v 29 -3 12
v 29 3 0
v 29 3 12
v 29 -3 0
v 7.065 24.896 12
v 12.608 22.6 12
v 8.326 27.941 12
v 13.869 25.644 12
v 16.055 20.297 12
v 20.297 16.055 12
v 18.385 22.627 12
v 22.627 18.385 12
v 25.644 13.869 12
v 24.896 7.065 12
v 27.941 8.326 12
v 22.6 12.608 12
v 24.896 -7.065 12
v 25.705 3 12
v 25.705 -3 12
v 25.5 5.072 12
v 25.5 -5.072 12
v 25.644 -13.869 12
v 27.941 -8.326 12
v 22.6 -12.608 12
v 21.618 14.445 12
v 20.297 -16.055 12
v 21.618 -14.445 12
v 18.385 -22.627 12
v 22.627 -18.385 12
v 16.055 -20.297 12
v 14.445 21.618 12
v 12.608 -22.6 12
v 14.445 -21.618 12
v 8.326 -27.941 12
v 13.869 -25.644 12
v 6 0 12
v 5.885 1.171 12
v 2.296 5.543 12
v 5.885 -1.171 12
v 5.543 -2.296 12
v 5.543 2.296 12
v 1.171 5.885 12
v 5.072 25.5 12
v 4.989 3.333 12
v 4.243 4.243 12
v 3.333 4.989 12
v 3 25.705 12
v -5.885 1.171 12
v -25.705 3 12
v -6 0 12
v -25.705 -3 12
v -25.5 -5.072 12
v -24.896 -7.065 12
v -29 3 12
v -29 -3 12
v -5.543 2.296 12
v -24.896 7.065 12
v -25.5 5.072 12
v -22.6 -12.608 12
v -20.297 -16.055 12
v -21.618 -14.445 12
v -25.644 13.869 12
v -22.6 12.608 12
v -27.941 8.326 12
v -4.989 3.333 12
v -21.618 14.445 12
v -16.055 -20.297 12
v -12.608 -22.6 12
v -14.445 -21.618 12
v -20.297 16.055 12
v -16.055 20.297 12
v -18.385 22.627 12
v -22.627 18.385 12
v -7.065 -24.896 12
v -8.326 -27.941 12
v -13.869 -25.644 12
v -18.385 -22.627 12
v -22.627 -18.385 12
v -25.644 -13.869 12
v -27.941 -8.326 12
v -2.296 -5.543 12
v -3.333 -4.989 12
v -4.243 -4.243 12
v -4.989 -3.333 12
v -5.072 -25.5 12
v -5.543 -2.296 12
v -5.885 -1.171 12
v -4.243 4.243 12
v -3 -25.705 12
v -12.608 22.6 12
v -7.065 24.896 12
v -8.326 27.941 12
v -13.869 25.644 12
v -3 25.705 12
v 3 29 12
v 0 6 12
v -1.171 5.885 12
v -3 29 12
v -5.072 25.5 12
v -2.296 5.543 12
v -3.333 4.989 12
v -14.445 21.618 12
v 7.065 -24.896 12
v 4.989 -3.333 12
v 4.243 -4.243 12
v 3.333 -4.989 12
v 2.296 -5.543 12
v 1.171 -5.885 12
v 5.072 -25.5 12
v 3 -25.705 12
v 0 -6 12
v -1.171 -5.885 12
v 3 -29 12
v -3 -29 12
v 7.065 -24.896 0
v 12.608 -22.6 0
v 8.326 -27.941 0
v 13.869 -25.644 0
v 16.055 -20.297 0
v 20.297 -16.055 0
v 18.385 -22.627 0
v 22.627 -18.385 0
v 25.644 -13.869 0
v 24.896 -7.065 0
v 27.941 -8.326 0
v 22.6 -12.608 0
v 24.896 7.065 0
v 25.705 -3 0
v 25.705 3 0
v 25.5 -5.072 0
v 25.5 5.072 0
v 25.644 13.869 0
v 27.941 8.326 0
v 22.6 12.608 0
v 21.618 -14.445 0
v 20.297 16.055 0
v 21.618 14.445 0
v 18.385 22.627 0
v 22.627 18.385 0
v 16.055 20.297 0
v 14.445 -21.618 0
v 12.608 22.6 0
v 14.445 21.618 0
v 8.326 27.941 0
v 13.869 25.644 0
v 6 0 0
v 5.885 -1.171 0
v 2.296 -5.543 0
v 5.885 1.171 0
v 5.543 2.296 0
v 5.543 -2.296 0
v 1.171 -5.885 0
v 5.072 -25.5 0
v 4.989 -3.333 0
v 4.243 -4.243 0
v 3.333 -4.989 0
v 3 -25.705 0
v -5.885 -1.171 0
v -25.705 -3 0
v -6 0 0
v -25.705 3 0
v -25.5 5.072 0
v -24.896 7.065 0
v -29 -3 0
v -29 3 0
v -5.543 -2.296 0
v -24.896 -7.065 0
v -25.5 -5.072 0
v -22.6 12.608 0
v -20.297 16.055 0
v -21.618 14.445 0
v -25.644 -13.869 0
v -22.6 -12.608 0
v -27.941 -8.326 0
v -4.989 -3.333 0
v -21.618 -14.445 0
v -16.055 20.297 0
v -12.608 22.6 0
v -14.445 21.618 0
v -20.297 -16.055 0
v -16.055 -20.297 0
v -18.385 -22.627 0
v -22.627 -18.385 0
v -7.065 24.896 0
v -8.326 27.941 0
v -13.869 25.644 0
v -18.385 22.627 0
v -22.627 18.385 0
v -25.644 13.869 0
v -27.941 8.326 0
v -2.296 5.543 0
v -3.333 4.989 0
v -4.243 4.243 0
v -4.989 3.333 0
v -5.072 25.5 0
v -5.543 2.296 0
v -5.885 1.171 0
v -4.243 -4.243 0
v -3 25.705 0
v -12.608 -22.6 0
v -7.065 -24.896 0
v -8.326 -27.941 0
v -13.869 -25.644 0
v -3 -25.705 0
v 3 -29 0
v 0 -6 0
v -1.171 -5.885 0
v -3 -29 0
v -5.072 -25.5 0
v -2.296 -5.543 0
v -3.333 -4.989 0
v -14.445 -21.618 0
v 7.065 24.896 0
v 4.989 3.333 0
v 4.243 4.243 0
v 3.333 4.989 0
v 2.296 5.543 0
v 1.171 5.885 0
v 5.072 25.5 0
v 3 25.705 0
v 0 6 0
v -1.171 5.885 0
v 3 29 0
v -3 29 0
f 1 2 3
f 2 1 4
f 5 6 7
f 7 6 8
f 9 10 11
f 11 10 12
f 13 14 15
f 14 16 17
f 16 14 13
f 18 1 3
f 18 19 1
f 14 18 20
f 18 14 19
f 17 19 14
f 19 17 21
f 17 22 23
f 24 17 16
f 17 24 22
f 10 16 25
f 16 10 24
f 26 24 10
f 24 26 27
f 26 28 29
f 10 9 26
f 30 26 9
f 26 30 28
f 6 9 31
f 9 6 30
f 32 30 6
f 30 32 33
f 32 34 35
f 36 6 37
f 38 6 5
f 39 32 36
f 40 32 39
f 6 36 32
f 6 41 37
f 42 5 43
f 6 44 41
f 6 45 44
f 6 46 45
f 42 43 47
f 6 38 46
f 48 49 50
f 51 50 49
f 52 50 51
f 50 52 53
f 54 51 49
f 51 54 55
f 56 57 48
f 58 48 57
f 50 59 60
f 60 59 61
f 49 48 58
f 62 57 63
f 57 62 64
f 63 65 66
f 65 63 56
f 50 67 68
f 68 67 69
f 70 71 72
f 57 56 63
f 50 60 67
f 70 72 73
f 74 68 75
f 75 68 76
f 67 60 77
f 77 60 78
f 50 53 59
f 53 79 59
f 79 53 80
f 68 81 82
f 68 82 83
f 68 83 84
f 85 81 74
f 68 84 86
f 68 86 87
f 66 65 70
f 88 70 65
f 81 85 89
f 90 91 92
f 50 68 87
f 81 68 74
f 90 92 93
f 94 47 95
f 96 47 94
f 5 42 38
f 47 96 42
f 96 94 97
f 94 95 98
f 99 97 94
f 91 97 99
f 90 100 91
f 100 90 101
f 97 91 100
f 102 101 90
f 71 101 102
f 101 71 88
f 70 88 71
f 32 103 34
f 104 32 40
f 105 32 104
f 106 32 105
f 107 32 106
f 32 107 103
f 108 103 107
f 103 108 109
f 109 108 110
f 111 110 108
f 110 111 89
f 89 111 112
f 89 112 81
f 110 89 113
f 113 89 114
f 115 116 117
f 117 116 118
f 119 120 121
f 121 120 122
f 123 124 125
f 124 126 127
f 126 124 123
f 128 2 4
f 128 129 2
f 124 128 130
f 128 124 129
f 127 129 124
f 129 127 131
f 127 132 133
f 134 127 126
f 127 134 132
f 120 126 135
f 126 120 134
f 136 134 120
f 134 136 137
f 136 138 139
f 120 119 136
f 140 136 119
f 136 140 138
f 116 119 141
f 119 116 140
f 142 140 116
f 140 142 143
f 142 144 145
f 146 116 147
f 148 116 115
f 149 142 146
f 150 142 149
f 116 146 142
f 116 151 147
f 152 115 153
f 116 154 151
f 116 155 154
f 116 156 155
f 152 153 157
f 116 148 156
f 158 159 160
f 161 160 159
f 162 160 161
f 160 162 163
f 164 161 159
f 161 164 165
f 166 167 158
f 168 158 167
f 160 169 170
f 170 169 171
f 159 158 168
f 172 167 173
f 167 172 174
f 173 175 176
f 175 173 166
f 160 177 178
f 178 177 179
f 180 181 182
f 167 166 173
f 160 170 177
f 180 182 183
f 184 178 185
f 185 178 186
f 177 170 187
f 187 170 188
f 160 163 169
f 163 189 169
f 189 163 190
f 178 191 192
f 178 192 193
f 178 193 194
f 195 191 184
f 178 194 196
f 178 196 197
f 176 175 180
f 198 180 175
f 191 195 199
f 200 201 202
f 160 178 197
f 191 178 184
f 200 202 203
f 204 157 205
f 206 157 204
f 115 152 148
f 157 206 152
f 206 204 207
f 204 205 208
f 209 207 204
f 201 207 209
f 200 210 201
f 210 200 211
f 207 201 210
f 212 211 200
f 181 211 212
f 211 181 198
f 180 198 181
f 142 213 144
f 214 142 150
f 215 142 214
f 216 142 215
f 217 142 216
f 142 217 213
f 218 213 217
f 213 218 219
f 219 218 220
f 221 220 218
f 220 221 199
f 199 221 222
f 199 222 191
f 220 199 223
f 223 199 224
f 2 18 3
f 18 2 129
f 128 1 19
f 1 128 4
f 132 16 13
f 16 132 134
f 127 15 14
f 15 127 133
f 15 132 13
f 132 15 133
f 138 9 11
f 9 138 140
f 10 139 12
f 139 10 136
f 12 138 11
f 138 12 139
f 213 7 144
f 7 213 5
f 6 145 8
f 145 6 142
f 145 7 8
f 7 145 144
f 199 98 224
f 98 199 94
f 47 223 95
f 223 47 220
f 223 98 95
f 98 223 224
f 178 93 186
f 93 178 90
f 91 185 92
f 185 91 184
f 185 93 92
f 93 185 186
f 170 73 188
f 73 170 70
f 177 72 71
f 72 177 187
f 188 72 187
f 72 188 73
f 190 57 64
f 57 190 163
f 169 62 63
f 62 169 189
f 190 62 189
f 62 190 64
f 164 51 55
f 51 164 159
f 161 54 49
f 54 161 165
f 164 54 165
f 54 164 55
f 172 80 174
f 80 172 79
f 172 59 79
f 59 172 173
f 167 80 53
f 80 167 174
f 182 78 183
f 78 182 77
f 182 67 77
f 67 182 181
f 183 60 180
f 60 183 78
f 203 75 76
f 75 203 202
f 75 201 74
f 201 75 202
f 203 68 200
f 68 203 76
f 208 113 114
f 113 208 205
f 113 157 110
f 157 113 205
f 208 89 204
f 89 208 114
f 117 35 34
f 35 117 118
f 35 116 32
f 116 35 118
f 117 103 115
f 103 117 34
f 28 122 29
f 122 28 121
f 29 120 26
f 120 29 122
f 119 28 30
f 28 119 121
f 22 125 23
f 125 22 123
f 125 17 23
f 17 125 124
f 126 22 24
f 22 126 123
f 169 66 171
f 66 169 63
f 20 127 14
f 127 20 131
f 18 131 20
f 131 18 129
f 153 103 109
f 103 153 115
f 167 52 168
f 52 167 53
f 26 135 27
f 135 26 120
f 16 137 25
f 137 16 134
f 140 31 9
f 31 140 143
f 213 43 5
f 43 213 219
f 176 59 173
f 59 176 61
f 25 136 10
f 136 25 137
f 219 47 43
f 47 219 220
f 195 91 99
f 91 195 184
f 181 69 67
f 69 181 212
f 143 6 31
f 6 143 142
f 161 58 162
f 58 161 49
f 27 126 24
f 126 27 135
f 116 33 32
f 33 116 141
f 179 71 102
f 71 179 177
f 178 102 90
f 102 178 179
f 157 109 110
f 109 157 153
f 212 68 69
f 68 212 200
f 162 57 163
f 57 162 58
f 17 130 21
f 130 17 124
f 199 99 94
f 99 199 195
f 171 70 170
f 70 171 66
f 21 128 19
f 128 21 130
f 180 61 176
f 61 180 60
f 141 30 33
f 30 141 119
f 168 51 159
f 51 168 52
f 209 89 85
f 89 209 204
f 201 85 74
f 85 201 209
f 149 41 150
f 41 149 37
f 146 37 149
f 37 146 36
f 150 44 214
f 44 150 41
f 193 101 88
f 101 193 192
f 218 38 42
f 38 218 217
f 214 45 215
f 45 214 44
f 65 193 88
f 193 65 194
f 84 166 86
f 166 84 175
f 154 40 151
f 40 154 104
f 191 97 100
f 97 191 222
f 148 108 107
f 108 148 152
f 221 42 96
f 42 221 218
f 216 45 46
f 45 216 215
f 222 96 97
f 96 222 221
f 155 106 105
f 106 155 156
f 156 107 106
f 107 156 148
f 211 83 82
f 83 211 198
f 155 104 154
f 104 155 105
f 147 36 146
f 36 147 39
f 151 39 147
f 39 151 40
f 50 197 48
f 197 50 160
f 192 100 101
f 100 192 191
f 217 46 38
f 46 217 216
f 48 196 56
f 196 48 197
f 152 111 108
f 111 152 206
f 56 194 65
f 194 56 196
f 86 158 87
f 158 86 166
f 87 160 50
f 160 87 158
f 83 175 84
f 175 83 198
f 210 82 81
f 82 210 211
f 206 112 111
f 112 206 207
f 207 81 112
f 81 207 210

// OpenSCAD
$fn = 32;

// ----------------------------------------------------------------------
// Spur blank: bored gear blank
// ----------------------------------------------------------------------

// --- parameters (mm) ---
disc_r = 26;              // blank root radius
disc_t = 12;              // blank thickness
n_teeth = 16;             // stub tooth count
tooth_w = 6;              // tooth width at the root
tooth_h = 3;              // tooth height above the root
bore_r = 6;               // central bore radius

out_r = disc_r + tooth_h;  // tip radius
bbox_x = 58.0;  // measured width over the teeth
bbox_y = 58.0;  // measured depth over the teeth

difference() {
union() {
  cylinder(r = disc_r, h = disc_t);
  for (i = [0 : n_teeth - 1])
    rotate([0, 0, i * 360 / n_teeth])
      translate([disc_r - 1, -tooth_w / 2, 0])
        cube([tooth_h + 1, tooth_w, disc_t]);
}
  translate([0, 0, -1]) cylinder(r = bore_r, h = disc_t + 2);
}
